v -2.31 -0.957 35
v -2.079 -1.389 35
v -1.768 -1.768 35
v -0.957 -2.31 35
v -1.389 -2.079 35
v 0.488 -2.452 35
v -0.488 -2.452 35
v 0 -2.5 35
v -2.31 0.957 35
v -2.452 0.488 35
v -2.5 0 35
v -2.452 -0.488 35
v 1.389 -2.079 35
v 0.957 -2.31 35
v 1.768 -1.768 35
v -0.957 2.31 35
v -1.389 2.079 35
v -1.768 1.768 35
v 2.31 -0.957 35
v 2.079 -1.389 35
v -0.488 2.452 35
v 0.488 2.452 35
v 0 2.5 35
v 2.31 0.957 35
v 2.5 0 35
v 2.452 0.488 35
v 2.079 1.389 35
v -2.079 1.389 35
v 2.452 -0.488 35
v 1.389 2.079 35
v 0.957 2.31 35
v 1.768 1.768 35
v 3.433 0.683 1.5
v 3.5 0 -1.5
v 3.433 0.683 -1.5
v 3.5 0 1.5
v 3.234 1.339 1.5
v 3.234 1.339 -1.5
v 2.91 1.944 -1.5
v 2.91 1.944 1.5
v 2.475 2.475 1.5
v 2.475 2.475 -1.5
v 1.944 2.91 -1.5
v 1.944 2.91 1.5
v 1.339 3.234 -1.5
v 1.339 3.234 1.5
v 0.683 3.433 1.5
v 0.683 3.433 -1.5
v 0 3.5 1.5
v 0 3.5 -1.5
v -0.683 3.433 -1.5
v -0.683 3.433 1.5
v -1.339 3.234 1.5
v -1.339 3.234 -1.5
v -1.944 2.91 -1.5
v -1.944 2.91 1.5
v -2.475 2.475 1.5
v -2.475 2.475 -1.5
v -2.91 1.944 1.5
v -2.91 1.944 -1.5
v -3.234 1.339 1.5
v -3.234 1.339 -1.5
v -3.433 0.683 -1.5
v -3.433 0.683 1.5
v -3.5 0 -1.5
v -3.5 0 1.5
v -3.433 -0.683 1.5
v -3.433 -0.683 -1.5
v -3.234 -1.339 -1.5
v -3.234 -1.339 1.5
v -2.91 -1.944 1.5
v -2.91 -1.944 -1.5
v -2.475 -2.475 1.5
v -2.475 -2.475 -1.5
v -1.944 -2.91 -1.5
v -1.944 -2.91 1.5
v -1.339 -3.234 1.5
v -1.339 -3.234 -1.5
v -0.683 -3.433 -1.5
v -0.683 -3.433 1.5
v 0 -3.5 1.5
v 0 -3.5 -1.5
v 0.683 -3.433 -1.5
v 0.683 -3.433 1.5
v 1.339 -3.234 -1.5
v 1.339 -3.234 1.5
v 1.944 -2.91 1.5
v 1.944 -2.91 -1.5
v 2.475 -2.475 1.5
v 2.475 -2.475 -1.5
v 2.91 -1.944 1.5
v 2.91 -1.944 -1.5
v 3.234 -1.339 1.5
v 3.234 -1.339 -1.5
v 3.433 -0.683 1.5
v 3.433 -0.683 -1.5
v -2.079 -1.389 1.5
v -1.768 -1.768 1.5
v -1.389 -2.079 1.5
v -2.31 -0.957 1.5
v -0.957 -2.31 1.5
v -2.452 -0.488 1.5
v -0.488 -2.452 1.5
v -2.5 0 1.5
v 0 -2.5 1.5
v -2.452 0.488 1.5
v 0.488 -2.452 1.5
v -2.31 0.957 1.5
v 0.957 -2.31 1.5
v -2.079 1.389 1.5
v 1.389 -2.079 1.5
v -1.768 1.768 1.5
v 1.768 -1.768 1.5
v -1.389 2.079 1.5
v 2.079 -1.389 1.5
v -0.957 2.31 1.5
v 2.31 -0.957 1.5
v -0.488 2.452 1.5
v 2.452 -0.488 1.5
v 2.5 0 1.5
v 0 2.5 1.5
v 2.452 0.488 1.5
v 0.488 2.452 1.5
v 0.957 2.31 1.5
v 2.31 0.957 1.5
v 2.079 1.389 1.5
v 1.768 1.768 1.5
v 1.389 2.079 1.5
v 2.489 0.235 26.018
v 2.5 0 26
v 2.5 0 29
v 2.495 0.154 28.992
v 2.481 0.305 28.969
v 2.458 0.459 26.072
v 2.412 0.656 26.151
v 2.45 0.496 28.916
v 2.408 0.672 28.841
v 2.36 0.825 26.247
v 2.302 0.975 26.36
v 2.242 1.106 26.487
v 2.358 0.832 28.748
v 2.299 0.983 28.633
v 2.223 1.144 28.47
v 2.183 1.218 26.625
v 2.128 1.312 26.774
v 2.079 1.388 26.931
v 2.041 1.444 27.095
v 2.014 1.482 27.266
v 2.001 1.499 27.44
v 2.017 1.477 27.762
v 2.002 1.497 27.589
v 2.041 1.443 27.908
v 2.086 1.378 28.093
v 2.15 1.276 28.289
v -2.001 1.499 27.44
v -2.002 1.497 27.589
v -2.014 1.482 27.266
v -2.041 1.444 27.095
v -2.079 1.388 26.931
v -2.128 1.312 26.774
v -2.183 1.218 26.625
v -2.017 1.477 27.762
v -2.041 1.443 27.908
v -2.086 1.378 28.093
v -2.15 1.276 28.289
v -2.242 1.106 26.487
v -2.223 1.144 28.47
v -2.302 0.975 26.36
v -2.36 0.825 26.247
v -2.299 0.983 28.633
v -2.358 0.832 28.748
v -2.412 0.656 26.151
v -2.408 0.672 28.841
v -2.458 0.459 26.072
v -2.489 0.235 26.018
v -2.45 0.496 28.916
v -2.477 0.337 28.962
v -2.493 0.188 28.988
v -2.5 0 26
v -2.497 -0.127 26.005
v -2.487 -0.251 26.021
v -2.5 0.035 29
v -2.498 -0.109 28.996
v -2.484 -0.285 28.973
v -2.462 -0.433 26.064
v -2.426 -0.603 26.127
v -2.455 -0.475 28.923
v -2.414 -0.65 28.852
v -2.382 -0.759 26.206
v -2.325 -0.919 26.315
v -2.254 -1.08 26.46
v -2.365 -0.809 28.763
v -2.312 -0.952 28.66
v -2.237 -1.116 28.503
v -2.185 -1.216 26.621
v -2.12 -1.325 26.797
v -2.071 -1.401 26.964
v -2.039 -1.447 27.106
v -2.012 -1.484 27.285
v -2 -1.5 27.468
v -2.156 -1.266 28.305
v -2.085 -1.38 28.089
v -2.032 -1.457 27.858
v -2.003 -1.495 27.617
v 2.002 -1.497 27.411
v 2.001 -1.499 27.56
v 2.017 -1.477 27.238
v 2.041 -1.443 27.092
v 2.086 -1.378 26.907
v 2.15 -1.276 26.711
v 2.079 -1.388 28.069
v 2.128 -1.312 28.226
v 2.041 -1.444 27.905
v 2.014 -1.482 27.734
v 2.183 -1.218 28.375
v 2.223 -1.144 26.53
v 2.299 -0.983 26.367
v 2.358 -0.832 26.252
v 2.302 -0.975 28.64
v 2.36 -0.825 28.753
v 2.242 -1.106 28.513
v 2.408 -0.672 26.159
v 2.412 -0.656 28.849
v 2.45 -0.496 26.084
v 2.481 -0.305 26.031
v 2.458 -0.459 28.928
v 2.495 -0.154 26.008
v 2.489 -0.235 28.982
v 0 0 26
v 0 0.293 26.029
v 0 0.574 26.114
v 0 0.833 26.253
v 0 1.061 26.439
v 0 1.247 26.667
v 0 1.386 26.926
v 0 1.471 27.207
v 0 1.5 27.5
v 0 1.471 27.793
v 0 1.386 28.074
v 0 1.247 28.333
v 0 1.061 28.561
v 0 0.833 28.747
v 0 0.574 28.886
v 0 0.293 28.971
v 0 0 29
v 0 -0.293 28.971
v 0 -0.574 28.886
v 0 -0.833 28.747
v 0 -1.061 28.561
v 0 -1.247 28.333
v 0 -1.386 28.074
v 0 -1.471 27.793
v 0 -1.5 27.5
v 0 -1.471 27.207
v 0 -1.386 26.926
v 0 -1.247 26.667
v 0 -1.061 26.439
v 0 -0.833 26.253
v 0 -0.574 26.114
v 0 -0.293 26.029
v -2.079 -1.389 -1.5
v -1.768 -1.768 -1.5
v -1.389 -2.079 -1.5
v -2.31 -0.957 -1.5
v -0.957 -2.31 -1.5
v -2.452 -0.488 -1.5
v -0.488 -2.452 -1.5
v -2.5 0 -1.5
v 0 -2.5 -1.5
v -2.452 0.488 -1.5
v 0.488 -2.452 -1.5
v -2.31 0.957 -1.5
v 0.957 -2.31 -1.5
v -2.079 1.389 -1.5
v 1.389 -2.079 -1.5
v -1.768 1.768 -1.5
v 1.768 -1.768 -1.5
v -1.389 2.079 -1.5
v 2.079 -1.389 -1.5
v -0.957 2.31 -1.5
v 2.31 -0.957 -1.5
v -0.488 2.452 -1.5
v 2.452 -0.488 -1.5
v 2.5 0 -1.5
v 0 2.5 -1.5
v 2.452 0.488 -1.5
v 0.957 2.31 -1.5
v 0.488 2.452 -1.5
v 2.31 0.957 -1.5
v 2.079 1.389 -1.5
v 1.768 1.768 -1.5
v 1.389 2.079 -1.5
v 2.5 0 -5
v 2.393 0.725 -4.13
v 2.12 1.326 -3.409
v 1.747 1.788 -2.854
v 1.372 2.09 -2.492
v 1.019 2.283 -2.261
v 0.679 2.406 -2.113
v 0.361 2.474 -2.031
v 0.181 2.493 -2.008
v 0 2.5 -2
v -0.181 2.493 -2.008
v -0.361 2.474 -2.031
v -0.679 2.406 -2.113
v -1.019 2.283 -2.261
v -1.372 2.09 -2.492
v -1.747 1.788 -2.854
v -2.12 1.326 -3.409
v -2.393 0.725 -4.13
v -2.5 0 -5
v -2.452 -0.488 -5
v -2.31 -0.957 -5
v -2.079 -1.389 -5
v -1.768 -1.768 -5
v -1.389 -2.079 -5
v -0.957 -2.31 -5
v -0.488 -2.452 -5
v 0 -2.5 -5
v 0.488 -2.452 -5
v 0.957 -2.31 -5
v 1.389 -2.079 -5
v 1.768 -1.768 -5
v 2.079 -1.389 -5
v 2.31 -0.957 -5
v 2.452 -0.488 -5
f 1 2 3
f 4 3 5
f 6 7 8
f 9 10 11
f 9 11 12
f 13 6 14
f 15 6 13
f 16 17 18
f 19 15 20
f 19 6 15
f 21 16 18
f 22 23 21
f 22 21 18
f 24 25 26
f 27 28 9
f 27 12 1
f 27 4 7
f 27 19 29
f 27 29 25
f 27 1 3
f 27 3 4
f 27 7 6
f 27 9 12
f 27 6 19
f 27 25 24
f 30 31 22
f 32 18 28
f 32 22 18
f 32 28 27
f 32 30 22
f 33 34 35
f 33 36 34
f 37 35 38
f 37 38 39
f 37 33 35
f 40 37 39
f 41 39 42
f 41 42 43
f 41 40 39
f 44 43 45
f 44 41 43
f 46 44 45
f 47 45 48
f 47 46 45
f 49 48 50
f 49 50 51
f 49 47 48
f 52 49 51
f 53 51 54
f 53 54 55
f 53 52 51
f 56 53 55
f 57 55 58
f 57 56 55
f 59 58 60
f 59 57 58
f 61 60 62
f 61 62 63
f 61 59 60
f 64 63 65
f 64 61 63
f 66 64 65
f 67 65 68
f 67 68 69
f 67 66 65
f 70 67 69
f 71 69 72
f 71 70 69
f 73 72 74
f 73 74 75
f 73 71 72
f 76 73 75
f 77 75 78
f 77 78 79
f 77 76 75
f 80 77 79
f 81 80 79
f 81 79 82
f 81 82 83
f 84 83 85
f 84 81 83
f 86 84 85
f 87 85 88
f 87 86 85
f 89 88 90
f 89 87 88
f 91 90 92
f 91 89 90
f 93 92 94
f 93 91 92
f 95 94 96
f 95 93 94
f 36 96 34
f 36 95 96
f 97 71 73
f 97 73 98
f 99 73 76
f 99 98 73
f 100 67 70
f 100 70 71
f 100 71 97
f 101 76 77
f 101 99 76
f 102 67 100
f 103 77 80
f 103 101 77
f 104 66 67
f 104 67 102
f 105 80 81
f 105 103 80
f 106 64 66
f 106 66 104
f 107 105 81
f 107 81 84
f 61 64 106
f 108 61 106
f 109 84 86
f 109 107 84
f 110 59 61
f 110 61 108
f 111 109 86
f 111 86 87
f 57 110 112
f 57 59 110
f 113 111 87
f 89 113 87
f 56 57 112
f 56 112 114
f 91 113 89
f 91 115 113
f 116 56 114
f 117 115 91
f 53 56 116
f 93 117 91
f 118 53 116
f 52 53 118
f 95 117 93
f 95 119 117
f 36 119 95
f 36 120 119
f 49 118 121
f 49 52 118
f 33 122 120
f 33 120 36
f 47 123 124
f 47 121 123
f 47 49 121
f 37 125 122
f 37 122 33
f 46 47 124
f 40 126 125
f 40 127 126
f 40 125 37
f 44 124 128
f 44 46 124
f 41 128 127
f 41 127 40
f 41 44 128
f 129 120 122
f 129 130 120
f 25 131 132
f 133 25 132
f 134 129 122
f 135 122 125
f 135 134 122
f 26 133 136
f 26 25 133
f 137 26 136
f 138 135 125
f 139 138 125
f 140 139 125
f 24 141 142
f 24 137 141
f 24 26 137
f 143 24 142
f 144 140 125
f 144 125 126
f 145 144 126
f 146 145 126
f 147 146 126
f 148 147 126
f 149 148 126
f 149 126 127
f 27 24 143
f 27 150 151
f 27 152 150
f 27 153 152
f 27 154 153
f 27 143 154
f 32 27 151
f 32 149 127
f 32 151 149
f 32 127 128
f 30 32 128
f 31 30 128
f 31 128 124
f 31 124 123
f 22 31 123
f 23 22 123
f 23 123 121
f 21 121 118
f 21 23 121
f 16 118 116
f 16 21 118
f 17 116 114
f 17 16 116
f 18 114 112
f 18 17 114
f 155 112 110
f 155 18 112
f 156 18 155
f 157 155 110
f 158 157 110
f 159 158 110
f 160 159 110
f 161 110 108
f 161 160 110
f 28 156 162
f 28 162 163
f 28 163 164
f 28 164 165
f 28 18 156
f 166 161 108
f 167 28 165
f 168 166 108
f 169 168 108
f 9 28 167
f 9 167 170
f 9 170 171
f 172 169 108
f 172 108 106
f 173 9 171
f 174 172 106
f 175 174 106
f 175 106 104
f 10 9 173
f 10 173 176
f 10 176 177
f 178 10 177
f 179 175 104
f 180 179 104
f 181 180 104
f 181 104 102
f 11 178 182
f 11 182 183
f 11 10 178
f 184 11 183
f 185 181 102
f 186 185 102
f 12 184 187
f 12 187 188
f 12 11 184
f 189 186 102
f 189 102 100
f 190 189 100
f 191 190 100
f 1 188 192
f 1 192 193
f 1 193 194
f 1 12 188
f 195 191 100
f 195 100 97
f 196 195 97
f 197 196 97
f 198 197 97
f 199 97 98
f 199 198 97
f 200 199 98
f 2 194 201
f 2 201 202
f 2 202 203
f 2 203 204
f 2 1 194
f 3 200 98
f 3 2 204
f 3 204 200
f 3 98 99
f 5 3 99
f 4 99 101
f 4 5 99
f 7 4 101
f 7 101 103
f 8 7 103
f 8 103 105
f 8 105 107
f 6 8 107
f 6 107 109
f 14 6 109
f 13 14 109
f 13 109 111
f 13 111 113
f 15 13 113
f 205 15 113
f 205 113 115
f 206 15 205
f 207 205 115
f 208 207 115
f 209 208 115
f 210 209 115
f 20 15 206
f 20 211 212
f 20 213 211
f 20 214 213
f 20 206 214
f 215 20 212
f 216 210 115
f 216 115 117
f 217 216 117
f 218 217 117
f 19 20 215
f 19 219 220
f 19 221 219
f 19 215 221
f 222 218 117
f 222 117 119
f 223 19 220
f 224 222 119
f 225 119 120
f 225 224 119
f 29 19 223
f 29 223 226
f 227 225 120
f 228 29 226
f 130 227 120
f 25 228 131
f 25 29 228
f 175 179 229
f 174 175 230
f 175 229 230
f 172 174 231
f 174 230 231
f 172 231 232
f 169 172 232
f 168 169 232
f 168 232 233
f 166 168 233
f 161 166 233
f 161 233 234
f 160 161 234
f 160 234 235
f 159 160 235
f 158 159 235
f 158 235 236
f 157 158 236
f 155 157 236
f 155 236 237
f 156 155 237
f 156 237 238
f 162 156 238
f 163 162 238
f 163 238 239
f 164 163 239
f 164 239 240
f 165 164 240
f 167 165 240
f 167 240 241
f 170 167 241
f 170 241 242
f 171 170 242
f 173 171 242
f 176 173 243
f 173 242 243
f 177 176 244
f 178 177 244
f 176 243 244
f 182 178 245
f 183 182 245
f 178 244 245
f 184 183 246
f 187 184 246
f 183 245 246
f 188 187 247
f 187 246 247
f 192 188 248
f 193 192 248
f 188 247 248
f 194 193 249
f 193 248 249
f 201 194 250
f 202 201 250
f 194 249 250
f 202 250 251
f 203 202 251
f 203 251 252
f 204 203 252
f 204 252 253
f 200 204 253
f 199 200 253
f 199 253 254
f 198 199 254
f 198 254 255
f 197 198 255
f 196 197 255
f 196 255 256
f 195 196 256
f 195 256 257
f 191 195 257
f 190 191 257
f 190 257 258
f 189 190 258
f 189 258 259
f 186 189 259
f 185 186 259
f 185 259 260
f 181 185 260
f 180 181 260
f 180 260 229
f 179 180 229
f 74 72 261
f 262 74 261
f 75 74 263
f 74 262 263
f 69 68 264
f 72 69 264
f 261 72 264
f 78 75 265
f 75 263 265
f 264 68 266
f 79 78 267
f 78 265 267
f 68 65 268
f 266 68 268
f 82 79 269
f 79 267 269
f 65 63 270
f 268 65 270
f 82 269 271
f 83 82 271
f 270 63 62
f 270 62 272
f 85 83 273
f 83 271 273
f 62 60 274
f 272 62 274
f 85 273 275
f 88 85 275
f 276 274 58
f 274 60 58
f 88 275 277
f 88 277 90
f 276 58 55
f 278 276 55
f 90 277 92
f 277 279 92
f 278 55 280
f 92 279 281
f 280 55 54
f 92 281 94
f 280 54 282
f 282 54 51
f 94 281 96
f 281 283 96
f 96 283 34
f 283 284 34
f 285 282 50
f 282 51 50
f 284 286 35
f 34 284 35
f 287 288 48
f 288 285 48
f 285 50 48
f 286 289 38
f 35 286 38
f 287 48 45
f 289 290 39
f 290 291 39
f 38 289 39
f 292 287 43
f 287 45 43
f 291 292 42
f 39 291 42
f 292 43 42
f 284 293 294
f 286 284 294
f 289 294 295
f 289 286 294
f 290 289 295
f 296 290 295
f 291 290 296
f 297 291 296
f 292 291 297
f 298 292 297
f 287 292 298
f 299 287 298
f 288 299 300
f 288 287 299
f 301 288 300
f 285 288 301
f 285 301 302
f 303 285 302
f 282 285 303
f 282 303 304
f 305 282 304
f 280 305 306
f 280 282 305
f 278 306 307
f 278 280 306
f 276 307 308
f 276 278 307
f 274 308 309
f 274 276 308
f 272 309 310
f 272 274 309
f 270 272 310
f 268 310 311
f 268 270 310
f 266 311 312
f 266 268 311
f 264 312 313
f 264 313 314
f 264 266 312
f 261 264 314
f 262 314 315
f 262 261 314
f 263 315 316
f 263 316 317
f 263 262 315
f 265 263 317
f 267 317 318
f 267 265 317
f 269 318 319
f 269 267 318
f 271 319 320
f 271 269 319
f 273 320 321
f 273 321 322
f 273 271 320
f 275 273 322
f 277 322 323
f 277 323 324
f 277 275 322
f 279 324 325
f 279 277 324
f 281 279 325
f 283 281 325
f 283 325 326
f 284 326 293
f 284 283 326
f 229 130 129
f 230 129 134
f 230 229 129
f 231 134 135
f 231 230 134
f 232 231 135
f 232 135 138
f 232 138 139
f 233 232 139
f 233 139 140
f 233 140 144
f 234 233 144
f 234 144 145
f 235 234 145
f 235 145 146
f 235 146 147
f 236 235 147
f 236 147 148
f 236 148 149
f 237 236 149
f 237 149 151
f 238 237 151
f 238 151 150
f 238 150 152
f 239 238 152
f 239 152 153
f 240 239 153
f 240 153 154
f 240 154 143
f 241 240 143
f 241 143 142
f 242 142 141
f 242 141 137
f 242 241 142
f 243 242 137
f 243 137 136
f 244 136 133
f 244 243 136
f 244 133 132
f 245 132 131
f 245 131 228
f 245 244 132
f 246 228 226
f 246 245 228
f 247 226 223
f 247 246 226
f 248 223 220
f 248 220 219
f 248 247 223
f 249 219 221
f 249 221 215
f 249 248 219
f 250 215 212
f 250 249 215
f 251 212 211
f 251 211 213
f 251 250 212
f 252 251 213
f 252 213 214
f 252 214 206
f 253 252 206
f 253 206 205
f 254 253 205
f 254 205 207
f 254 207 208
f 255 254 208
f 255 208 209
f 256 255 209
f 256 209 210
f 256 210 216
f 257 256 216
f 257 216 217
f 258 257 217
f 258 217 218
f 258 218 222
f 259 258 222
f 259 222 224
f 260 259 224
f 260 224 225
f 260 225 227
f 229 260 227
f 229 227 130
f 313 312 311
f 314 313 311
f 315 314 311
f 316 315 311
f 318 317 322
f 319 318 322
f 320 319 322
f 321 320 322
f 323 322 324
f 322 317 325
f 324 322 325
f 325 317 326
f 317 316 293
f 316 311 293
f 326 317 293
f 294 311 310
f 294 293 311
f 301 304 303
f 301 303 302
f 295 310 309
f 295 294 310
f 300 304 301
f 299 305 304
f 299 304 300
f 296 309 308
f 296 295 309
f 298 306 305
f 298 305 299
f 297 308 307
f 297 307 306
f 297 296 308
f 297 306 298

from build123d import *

# Parameters (mm, degrees)
SKETCH1_R                = 2.5
BOSS_EXTRUDE1_DEPTH      = 35
BOSS_EXTRUDE1_DEPTH_BACK = 5
SKETCH2_R                = 3.5
BOSS_EXTRUDE2_DEPTH      = 1.5
BOSS_EXTRUDE2_DEPTH_BACK = 1.5
SKETCH3_R                = 1.5
CUT_EXTRUDE1_DEPTH       = 4.5
CUT_EXTRUDE1_DEPTH_BACK  = 4.5
CUT_EXTRUDE2_DEPTH       = 4.5
CUT_EXTRUDE2_DEPTH_BACK  = 4.5


with BuildPart() as part:
    # Sketch1 → Boss-Extrude1 (new body, two sides)
    with BuildSketch(Plane.XY) as boss_extrude1_sk:
        Circle(SKETCH1_R)
    extrude(amount=BOSS_EXTRUDE1_DEPTH)
    extrude(boss_extrude1_sk.sketch, amount=-BOSS_EXTRUDE1_DEPTH_BACK)

    # Sketch2 → Boss-Extrude2 (add, two sides)
    with BuildSketch(Plane.XY) as boss_extrude2_sk:
        Circle(SKETCH2_R)
    extrude(amount=BOSS_EXTRUDE2_DEPTH)
    extrude(boss_extrude2_sk.sketch, amount=-BOSS_EXTRUDE2_DEPTH_BACK)

    # Sketch3 → Cut-Extrude1 (cut, two sides)
    with BuildSketch(Plane(origin=(0, 0, 0), x_dir=(0, 0, -1), z_dir=(1, 0, 0))) as cut_extrude1_sk:
        with Locations((-27.5, 0)):
            Circle(SKETCH3_R)
    extrude(amount=CUT_EXTRUDE1_DEPTH, mode=Mode.SUBTRACT)
    extrude(cut_extrude1_sk.sketch, amount=-CUT_EXTRUDE1_DEPTH_BACK, mode=Mode.SUBTRACT)

    # Sketch4 → Cut-Extrude2 (cut, two sides)
    with BuildSketch(Plane(origin=(0, 0, 0), x_dir=(0, 0, -1), z_dir=(1, 0, 0))) as cut_extrude2_sk:
        Polygon((5, 0), (2, 2.5), (5, 2.5), align=None)
    extrude(amount=CUT_EXTRUDE2_DEPTH, mode=Mode.SUBTRACT)
    extrude(cut_extrude2_sk.sketch, amount=-CUT_EXTRUDE2_DEPTH_BACK, mode=Mode.SUBTRACT)


solid = part.part
